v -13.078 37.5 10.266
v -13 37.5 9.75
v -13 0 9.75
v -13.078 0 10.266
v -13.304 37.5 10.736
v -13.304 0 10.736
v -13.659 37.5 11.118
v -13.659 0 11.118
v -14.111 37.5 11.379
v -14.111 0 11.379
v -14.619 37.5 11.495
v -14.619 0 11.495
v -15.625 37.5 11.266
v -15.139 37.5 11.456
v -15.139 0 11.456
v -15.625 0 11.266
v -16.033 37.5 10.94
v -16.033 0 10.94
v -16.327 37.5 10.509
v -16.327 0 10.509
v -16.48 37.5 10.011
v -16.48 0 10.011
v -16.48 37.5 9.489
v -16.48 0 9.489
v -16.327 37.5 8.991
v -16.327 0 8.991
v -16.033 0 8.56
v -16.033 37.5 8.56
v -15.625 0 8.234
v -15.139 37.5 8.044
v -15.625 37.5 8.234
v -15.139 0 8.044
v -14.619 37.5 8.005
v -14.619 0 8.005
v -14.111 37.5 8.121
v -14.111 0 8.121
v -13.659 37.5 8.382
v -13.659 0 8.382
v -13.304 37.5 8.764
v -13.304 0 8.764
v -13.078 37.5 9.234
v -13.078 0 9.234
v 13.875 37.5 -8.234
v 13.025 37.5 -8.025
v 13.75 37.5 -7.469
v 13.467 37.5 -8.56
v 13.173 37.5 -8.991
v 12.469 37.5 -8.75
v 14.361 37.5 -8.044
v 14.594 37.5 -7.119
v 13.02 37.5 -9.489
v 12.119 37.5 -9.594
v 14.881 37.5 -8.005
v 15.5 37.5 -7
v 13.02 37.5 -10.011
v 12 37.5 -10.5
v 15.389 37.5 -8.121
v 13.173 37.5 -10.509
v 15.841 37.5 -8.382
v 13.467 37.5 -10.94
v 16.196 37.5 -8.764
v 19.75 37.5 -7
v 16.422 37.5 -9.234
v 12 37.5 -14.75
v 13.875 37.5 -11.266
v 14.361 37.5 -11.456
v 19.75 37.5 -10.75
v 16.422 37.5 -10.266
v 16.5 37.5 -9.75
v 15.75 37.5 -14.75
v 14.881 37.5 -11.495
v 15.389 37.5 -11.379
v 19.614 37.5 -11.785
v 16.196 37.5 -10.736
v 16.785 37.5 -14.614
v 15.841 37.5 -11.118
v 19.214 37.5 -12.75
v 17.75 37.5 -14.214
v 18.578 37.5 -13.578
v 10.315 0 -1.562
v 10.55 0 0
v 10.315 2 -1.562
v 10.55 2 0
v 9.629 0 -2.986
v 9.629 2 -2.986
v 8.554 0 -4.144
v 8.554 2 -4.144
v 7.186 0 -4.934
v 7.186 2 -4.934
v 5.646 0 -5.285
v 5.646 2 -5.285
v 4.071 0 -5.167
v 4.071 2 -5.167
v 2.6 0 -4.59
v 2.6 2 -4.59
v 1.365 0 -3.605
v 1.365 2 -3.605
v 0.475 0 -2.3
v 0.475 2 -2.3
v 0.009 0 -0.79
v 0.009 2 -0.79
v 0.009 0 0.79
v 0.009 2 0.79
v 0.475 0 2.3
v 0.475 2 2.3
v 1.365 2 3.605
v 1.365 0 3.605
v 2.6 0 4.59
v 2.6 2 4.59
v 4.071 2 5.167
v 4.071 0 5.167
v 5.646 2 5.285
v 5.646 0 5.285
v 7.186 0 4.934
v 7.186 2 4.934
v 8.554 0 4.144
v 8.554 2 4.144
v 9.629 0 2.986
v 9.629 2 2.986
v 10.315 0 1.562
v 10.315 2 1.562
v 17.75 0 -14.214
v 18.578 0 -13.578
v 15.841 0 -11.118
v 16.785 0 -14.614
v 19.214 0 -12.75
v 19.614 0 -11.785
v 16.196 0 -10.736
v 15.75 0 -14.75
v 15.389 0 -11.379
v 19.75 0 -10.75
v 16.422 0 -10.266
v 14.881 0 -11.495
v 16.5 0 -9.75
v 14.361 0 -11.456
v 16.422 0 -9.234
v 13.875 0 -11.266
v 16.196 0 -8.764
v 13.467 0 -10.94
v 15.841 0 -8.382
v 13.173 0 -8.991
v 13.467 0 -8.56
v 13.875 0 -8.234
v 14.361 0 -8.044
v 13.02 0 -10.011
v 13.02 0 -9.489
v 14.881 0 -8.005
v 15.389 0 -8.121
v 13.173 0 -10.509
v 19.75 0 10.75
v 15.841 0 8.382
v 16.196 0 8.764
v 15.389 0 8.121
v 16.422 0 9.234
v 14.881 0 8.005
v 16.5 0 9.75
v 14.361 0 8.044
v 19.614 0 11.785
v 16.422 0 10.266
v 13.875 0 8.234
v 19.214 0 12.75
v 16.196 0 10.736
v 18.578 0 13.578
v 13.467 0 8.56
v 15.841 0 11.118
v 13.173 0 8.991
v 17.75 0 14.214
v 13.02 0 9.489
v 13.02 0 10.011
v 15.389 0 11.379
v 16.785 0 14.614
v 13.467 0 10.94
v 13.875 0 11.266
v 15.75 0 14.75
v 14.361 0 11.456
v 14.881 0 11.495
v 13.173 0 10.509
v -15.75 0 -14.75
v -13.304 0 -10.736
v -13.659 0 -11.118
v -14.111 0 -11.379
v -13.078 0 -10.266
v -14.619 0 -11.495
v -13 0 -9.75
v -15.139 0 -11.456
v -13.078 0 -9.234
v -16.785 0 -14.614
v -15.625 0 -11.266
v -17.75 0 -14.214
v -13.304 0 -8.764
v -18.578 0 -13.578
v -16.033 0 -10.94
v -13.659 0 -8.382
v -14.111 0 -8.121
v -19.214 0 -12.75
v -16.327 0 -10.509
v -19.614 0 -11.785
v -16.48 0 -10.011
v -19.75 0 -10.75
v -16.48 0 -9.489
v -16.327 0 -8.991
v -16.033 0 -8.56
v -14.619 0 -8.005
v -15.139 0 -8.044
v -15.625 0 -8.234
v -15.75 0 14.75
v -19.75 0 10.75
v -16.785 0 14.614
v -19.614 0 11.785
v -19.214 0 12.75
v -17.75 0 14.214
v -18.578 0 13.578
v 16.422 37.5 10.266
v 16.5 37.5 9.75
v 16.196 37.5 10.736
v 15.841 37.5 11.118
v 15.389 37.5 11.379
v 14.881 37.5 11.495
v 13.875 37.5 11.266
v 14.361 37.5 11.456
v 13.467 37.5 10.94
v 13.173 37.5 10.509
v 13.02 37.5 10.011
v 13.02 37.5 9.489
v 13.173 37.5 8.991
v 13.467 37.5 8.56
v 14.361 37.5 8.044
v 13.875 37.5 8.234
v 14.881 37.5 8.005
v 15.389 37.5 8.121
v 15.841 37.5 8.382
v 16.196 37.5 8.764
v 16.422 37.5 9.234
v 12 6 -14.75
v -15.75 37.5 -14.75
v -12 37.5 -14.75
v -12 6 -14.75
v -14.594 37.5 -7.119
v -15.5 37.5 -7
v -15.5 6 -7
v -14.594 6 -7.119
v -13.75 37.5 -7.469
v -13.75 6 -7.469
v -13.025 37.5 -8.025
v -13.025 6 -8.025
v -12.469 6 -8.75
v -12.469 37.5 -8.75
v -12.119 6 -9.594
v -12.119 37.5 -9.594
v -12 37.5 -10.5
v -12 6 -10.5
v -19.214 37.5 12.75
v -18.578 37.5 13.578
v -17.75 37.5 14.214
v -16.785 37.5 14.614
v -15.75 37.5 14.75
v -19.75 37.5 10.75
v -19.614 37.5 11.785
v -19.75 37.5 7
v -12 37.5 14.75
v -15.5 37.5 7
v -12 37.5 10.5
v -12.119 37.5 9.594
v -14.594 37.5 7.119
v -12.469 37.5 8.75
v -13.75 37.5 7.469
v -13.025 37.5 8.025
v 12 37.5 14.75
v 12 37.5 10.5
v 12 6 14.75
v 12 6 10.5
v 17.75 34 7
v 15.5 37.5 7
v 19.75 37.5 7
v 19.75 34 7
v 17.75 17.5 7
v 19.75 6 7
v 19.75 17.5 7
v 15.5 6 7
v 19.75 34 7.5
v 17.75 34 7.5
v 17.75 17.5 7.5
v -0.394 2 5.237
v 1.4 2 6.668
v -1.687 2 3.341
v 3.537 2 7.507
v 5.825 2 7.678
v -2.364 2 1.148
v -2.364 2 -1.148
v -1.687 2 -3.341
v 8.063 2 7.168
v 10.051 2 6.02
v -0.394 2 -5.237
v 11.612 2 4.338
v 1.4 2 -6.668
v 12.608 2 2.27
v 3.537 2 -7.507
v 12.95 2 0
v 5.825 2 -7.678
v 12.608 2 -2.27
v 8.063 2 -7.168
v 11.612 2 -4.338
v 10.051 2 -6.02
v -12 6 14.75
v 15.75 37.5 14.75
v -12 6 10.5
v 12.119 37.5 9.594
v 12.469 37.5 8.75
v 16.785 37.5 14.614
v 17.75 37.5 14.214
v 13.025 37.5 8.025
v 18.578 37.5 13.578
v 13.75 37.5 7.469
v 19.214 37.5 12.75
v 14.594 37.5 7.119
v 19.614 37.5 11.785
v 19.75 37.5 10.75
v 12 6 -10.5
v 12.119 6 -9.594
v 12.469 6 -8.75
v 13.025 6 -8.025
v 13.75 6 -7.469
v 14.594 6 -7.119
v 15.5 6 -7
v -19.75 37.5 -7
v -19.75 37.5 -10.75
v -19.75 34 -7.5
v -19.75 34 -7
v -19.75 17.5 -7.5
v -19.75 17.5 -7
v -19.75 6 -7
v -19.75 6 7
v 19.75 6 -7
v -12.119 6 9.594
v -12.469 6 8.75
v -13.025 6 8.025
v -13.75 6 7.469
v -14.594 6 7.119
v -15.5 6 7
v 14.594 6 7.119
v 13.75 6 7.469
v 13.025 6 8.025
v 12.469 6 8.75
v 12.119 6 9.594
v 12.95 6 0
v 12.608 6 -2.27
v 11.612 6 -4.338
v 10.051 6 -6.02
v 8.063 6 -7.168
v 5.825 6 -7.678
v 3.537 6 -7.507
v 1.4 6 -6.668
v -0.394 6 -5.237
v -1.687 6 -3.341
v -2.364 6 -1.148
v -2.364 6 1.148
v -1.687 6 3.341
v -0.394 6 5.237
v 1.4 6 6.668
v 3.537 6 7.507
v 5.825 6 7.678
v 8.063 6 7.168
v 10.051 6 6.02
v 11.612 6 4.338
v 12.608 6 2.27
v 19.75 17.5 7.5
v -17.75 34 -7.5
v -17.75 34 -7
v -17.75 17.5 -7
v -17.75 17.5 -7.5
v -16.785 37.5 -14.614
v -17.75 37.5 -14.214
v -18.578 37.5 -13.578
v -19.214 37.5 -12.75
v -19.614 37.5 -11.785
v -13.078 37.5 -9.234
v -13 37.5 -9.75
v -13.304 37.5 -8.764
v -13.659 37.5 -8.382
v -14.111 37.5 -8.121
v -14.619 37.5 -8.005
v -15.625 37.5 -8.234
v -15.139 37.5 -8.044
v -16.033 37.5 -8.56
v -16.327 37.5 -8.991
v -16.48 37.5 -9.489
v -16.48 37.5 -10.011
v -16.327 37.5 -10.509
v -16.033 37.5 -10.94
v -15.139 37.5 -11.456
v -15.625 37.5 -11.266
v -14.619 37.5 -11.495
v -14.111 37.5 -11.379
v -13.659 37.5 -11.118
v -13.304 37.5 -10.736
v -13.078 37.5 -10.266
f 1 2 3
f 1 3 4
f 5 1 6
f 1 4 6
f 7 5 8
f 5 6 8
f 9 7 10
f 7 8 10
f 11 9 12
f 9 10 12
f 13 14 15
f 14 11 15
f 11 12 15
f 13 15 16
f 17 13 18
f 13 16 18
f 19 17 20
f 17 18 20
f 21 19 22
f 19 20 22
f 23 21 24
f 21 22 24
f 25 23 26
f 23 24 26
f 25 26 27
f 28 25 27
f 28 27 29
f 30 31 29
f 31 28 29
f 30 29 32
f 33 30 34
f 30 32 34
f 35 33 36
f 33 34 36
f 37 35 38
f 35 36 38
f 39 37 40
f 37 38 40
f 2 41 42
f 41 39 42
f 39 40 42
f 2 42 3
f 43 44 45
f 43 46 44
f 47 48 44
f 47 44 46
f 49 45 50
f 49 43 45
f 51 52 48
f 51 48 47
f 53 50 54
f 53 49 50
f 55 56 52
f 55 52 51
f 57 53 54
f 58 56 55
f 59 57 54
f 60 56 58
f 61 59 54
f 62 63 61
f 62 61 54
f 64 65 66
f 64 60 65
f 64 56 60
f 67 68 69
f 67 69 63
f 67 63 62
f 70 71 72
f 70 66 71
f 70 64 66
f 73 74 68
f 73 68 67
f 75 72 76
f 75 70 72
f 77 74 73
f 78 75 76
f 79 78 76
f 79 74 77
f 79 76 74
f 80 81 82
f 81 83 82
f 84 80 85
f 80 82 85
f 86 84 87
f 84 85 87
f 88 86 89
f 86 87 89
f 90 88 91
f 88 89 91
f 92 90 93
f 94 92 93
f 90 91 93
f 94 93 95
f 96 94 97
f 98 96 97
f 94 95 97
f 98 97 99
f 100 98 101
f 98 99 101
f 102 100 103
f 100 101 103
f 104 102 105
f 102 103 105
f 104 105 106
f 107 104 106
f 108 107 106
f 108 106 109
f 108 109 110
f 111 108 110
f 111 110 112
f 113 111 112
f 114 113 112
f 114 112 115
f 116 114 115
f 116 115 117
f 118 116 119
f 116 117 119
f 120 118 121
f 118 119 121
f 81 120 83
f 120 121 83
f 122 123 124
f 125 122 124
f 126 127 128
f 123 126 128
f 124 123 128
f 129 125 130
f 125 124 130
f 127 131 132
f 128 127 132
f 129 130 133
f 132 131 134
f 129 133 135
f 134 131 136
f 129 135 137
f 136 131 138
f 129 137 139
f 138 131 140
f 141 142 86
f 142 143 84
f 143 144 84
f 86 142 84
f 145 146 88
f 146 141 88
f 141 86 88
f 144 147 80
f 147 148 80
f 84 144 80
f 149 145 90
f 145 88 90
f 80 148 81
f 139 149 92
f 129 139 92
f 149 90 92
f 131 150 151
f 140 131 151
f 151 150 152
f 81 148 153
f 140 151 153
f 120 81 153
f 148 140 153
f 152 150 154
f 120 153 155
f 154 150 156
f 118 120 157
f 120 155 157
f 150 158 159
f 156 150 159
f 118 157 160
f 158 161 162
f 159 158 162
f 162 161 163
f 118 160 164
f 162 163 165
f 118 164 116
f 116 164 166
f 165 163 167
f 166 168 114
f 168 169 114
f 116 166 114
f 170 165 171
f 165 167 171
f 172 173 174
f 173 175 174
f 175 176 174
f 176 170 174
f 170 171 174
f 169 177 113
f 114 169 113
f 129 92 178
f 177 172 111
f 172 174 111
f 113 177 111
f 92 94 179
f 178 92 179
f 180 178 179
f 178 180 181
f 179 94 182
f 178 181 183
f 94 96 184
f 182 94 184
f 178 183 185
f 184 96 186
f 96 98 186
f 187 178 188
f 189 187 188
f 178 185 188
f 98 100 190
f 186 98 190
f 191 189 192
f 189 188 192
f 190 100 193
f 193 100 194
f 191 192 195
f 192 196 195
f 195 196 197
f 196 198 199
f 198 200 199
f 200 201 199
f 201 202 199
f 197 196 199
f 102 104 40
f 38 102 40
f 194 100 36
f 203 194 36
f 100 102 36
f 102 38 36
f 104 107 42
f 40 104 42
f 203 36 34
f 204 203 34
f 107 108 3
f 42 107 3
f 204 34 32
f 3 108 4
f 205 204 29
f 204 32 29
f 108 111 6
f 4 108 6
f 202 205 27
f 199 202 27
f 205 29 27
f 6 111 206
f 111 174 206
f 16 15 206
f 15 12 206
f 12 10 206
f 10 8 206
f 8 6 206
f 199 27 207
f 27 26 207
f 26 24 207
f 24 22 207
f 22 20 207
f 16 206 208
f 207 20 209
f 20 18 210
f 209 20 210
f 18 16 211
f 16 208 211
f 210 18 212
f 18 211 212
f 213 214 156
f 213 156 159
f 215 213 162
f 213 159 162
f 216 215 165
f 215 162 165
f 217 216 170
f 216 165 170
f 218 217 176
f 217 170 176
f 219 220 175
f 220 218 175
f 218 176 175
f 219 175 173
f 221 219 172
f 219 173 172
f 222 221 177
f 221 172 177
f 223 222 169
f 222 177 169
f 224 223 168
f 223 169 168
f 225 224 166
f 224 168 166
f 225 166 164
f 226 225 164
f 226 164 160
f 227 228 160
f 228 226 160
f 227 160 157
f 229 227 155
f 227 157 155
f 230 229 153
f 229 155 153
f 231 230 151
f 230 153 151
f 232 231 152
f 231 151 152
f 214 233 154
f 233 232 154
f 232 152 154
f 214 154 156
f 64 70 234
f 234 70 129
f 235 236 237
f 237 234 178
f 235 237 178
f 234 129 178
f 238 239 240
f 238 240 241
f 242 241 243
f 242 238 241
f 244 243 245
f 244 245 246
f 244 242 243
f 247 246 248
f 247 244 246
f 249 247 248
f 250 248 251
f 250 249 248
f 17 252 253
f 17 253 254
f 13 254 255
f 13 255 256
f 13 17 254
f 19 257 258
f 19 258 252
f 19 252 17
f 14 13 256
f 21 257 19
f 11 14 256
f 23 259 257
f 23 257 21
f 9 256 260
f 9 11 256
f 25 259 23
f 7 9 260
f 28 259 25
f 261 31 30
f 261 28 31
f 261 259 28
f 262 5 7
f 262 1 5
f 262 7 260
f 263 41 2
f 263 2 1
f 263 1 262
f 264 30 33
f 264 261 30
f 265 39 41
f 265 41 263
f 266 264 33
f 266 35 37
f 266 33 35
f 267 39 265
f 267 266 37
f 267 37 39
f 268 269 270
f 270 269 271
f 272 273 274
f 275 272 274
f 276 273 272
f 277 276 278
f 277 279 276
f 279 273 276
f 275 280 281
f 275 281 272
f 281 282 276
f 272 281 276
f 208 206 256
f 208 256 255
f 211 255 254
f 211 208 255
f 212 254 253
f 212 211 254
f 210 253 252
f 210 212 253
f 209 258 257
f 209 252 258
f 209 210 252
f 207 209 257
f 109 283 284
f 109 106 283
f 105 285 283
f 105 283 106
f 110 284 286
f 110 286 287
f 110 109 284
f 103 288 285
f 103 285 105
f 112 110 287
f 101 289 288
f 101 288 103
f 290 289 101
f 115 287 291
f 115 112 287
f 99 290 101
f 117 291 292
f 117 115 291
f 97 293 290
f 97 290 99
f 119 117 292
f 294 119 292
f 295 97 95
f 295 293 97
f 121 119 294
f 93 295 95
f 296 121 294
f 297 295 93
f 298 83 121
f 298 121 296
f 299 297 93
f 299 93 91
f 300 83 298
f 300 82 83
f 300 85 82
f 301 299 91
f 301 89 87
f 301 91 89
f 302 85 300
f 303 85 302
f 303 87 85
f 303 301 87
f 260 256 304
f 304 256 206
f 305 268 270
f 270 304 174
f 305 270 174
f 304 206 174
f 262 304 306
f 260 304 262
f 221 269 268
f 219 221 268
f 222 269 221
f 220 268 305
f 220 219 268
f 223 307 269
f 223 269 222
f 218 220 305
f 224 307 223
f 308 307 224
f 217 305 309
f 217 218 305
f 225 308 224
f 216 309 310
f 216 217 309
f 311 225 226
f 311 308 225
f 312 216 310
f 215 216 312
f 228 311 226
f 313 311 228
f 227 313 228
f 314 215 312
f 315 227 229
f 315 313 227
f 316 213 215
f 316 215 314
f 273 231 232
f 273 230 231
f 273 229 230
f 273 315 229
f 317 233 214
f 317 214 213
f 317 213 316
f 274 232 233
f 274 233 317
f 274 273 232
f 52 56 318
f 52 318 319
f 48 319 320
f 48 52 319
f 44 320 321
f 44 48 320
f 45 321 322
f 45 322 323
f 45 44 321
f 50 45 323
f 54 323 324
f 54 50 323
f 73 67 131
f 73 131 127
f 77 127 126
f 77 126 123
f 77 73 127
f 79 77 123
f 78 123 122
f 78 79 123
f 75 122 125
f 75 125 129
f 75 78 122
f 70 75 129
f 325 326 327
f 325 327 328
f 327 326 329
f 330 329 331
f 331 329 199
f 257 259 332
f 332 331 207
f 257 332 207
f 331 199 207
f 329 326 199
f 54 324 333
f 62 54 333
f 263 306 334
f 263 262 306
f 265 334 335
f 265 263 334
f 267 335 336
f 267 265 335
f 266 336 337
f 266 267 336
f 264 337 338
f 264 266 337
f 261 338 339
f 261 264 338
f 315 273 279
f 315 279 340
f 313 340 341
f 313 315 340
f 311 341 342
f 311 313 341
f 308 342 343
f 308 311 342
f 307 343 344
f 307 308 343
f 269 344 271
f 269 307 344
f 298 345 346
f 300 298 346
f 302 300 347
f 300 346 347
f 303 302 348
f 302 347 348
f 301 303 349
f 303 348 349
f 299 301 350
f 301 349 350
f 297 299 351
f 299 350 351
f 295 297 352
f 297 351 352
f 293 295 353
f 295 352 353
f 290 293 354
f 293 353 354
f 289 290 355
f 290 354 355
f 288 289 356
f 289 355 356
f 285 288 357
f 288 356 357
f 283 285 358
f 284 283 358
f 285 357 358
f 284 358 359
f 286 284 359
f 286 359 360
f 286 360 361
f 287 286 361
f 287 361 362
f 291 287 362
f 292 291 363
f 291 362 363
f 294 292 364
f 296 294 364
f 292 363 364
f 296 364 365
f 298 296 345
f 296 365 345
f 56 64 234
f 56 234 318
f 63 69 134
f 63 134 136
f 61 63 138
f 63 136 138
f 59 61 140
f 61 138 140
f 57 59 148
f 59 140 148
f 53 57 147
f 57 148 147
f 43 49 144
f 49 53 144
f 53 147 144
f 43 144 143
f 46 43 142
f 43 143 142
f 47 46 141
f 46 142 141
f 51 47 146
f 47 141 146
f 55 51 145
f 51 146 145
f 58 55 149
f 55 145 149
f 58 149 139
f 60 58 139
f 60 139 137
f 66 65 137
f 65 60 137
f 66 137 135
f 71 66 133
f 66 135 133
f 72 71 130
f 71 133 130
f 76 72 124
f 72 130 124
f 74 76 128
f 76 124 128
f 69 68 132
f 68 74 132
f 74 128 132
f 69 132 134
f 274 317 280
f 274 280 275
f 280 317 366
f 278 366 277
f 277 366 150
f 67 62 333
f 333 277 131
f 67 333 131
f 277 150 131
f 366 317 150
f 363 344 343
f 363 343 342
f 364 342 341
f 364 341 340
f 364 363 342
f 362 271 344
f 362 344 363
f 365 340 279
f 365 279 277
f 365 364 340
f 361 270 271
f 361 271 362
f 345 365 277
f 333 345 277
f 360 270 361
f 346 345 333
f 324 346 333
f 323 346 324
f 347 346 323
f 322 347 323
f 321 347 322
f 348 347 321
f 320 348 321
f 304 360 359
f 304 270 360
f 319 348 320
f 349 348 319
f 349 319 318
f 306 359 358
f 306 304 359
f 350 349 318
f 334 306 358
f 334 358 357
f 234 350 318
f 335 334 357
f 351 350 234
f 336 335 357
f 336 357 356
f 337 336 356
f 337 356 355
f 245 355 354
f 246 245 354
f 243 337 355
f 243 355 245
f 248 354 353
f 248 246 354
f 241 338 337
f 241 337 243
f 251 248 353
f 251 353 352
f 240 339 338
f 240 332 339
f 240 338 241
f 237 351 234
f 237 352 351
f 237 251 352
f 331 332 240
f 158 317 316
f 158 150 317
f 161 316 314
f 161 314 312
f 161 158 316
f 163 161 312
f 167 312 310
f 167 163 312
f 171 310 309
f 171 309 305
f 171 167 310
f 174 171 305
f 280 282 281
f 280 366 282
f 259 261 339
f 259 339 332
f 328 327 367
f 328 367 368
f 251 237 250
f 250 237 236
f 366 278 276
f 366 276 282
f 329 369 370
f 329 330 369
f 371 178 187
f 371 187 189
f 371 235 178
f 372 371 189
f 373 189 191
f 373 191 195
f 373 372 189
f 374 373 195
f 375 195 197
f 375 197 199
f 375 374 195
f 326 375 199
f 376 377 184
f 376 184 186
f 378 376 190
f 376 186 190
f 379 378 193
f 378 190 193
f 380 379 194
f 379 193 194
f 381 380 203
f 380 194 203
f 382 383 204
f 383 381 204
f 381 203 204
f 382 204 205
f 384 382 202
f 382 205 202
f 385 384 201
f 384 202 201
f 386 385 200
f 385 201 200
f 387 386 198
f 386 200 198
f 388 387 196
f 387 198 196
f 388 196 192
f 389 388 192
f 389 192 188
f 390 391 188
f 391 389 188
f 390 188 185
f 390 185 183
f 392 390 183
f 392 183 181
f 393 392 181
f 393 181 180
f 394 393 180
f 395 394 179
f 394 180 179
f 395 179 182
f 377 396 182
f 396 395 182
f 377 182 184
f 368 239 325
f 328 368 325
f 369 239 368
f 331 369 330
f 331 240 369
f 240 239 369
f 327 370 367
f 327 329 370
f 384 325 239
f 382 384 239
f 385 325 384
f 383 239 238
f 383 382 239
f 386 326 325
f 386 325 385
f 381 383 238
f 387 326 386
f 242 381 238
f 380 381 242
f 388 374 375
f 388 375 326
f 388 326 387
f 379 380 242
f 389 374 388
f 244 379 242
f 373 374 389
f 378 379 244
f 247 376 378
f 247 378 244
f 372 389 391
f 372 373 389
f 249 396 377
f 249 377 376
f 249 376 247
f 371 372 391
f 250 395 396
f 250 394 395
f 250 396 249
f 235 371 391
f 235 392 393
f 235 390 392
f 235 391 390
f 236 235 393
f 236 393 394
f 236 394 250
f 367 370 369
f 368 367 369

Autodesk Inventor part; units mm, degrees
ref_plane "YZ Plane" through (0, 0, 0) normal (1, 0, 0) x (0, 1, 0)
ref_plane "XZ Plane" through (0, 0, 0) normal (0, 1, 0) x (-1, 0, 0)
ref_plane "XY Plane" through (0, 0, 0) normal (0, 0, 1) x (1, 0, 0)
sketch "Skizze1" plane through (0, 0, 0) normal (0, 1, 0) x (-1, 0, 0)
  line L0 (-19.75, -14.75) -> (19.75, -14.75)
  line L1 (19.75, -14.75) -> (19.75, 14.75)
  line L2 (19.75, 14.75) -> (-19.75, 14.75)
  line L3 (-19.75, 14.75) -> (-19.75, -14.75)
  line L4 (0, -20.65) -> (0, 20.65) projected
  line L5 (27.65, 0) -> (-27.65, 0) projected
  point P0 (0, 0)
  dimension "d0" = 39.5
  dimension "d1" = 29.5
extrude "Extrusion1" add sketch "Skizze1" along normal blind 6
sketch "Skizze2" plane through (0, 6, 0) normal (0, 1, 0) x (1, 0, 0)
  line L0 (19.75, 14.75) -> (-19.75, 14.75) projected
  line L1 (-19.75, 14.75) -> (-11.75, 14.75)
  line L2 (-12, 12.75) -> (-12, 7)
  line L3 (-12, 7) -> (-17.75, 7)
  line L4 (-19.75, 6.75) -> (-19.75, 14.75)
  line L5 (19.75, 14.75) -> (10.75, 14.75)
  line L6 (12, 12.75) -> (12, 7)
  line L7 (12, 7) -> (17.75, 7)
  line L8 (19.75, 10.8731) -> (19.75, 14.75)
  line L9 (-19.75, -14.75) -> (19.75, -14.75) projected
  line L10 (-19.75, -14.75) -> (-11.75, -14.75)
  line L11 (-12, -12.75) -> (-12, -7)
  line L12 (-12, -7) -> (-17.75, -7)
  line L13 (-19.75, -6.75) -> (-19.75, -14.75)
  line L14 (19.75, -14.75) -> (11.75, -14.75)
  line L15 (12, -12.75) -> (12, -7)
  line L16 (12, -7) -> (17.75, -7)
  line L17 (19.75, -6.75) -> (19.75, -14.75)
  circle A0 centre (-14.75, 9.75) radius 1.75
  circle A1 centre (-14.75, -9.75) radius 1.75
  circle A2 centre (14.75, -9.75) radius 1.75
  circle A3 centre (14.75, 9.75) radius 1.75
  line L18 (-19.75, 14.75) -> (-19.75, -14.75) projected
  line L19 (-19.75, 14.75) -> (19.75, 14.75)
  line L20 (19.75, 14.75) -> (19.75, -14.75)
  line L21 (19.75, -14.75) -> (-19.75, -14.75)
  line L22 (-19.75, -14.75) -> (-19.75, 14.75)
  line L23 (17.75, 12.75) -> (-17.75, 12.75)
  line L24 (-17.75, 12.75) -> (-17.75, -12.75)
  line L25 (-17.75, -12.75) -> (17.75, -12.75)
  line L26 (17.75, 12.75) -> (17.75, -12.75)
  point P0 (0, 0)
  dimension "d12" = 3.5
  dimension "d13" = 5
  dimension "d14" = 5
  dimension "d15" = 3.5
  dimension "d16" = 5
  dimension "d17" = 5
  dimension "d18" = 3.5
  dimension "d19" = 5
  dimension "d20" = 5
  dimension "d21" = 3.5
  dimension "d22" = 5
  dimension "d23" = 5
  dimension "d24" = 2
  dimension "d25" = 2
  dimension "d28" = 2
  dimension "d29" = 2
  dimension "d30" = 7.75
  dimension "d31" = 7.75
  dimension "d35" = 7.75
  dimension "d36" = 7.75
  dimension "d37" = 7.75
  dimension "d38" = 7.75
  dimension "d39" = 7.75
  dimension "d40" = 7.75
sketch "Skizze3" plane through (0, 6, 0) normal (0, 1, 0) x (1, 0, 0)
  circle A0 centre (5.25, 0) radius 7.7
  line L0 (19.75, -14.75) -> (19.75, 14.75) projected
  line L1 (19.75, 14.75) -> (-19.75, 14.75) projected
  point P0 (0, 0)
  dimension "d32" = 15.4
  dimension "d33" = 14.5
  dimension "d34" = 14.75
extrude "Extrusion2" add sketch "Skizze2" along normal blind 31.5 contours L8 L20 L17 L9 L13 L18 L4 L0
extrude "Extrusion3" cut sketch "Skizze3" against normal blind 4
sketch "Skizze4" plane through (5.25, 2, 0) normal (0, 1, 0) x (1, 0, 0)
  circle A0 centre (0, 0) radius 5.3
  point P0 (-5.25, 0)
  dimension "d45" = 10.6
extrude "Extrusion4" cut sketch "Skizze4" against normal up to surface (2 mm away)
extrude "Extrusion5" add sketch "Skizze2" along normal blind 31.5 contours L26 L25 L15 L16
extrude "Extrusion6" add sketch "Skizze2" along normal blind 31.5 contours L2 L3 L24 L23 | L23 L26 L7 L6 | L12 L11 L25 L24
extrude "Extrusion7" cut sketch "Skizze2" against normal up to surface (6 mm away) contours A0 | A1 | A2 | A3
fillet "Rundung1" radius 3.5 4 edges at (-12, 21.75, -7) (12, 21.75, -7) (-12, 21.75, 7) (12, 21.75, 7)
fillet "Rundung2" radius 4 4 edges at (19.75, 18.75, 14.75) (19.75, 18.75, -14.75) (-19.75, 18.75, -14.75) (-19.75, 18.75, 14.75)
sketch "Skizze5" plane through (-15.75, 0, 14.75) normal (0, 0, 1) x (1, 0, 0)
  line L0 (3.75, 34) -> (27.75, 34)
  line L1 (27.75, 34) -> (27.75, 17.5)
  line L2 (27.75, 17.5) -> (3.75, 17.5)
  line L3 (3.75, 17.5) -> (3.75, 34)
  line L4 (0, 37.5) -> (31.5, 37.5) projected
  line L5 (-4, 37.5) -> (-4, 0) projected
  line L6 (35.5, 0) -> (35.5, 37.5) projected
  point P0 (15.75, 0)
  dimension "d56" = 16.5
  dimension "d57" = 3.5
  dimension "d58" = 7.75
  dimension "d59" = 7.75
sketch "Skizze6" plane through (15.75, 0, -14.75) normal (0, 0, -1) x (-1, 0, 0)
  line L0 (31.25, 6) -> (27.75, 6) projected
  line L1 (3.75, 34) -> (27.75, 34)
  line L2 (27.75, 34) -> (27.75, 6)
  line L3 (27.75, 6) -> (3.75, 6)
  line L4 (3.75, 6) -> (3.75, 34)
  line L5 (0, 37.5) -> (31.5, 37.5) projected
  point P0 (15.75, 0)
  dimension "d60" = 3.5
extrude "Extrusion8" cut sketch "Skizze6" against normal up to surface (2 mm away)
extrude "Extrusion9" cut sketch "Skizze5" against normal up to surface (2 mm away)
sketch "Skizze7" plane through (-19.75, 0, -10.75) normal (-1, 0, 0) x (0, 0, 1)
  line L0 (3.25, 34) -> (17.25, 34)
  line L1 (17.25, 34) -> (17.25, 17.5)
  line L2 (17.25, 17.5) -> (3.25, 17.5)
  line L3 (3.25, 17.5) -> (3.25, 34)
  line L4 (-4, 37.5) -> (-4, 0) projected
  line L5 (0, 37.5) -> (21.5, 37.5) projected
  point P0 (10.75, 0)
  dimension "d65" = 14
  dimension "d66" = 16.5
  dimension "d67" = 7.25
  dimension "d68" = 3.5
extrude "Extrusion10" cut sketch "Skizze7" against normal up to surface (2 mm away)
sketch "Skizze8" plane through (19.75, 0, 10.75) normal (1, 0, 0) x (0, 0, -1)
  line L0 (3.25, 34) -> (17.25, 34)
  line L1 (17.25, 34) -> (17.25, 17.5)
  line L2 (17.25, 17.5) -> (3.25, 17.5)
  line L3 (3.25, 17.5) -> (3.25, 34)
  line L4 (-4, 37.5) -> (-4, 0) projected
  line L5 (0, 37.5) -> (21.5, 37.5) projected
  point P0 (10.75, 0)
  dimension "d71" = 14
  dimension "d72" = 16.5
  dimension "d73" = 7.25
  dimension "d74" = 3.5
extrude "Extrusion11" cut sketch "Skizze8" against normal up to surface (2 mm away)
sketch "Skizze12" plane through (15.75, 0, -14.75) normal (0, 0, -1) x (-1, 0, 0)
  line L0 (27.75, 34) -> (3.75, 34) projected
  line L1 (27.75, 6) -> (27.75, 37.5) projected
  line L2 (3.75, 34) -> (27.75, 34)
  line L3 (27.75, 34) -> (27.75, 37.5)
  line L4 (27.75, 37.5) -> (3.75, 37.5)
  line L5 (3.75, 37.5) -> (3.75, 34)
  point P0 (15.75, 0)
extrude "Extrusion14" cut sketch "Skizze12" against normal up to surface (2 mm away)
sketch "Skizze13" plane through (12, 37.5, 12.75) normal (0, 0, -1) x (-1, 0, 0)
  line L0 (0, 0) -> (0, -31.5) projected
  line L1 (24, -31.5) -> (24, 0) projected
  line L2 (0, -3.5027) -> (24, -3.5027)
  line L3 (24, -3.5027) -> (24, 0)
  line L4 (24, 0) -> (0, 0)
  line L5 (0, 0) -> (0, -3.5027)
  point P0 (12, -37.5)
  point P1 (24, -3.5027)
extrude "Extrusion15" cut sketch "Skizze13" against normal up to surface (2 mm away)
sketch "Skizze14" plane through (-15.75, 0, 14.75) normal (0, 0, 1) x (1, 0, 0)
  line L0 (3.75, 6) -> (3.75, 17.5) projected
  line L1 (27.75, 17.5) -> (27.75, 6) projected
  line L2 (3.75, 17.5) -> (27.75, 17.5)
  line L3 (27.75, 17.5) -> (27.75, 6)
  line L4 (27.75, 6) -> (3.75, 6)
  line L5 (3.75, 6) -> (3.75, 17.5)
  point P0 (15.75, 0)
  point P1 (27.75, 17.5)
extrude "Extrusion16" cut sketch "Skizze14" against normal up to surface (2 mm away)
sketch "Skizze15" plane through (-19.75, 0, -10.75) normal (-1, 0, 0) x (0, 0, 1)
  point P0 (10.75, 0)
sketch "Skizze16" plane through (-17.75, 6, 7) normal (1, 0, 0) x (0, 0, -1)
  line L0 (14, 0) -> (0, 0) projected
  line L1 (14, 11.5) -> (14, 28) projected
  line L2 (0, 0) -> (14, 0)
  line L3 (14, 0) -> (14, 11.5)
  line L4 (14, 11.5) -> (0, 11.5)
  line L5 (0, 11.5) -> (0, 0)
  line L6 (0, 31.5) -> (14, 31.5) projected
  line L7 (14, 28) -> (0, 28)
  line L8 (0, 28) -> (0, 31.5)
  line L9 (0, 31.5) -> (14, 31.5)
  line L10 (14, 31.5) -> (14, 28)
  point P0 (7, -6)
extrude "Extrusion17" cut sketch "Skizze16" against normal up to surface (2 mm away) contours L7 L8 L6 L10
extrude "Extrusion18" cut sketch "Skizze16" against normal up to surface (2 mm away) contours L0 L5 L4 L3
sketch "Skizze17" plane through (-17.75, 34, 6.5) normal (0, 0, -1) x (-1, 0, 0)
  line L0 (0, 0) -> (2, 0) projected
  line L1 (2, 0) -> (2, -16.5) projected
  line L2 (0, 0) -> (2, 0)
  line L3 (2, 0) -> (2, -16.5)
  line L4 (2, -16.5) -> (0, -16.5)
  line L5 (0, -16.5) -> (0, 0)
  point P0 (-17.75, -34)
extrude "Extrusion19" cut sketch "Skizze17" against normal blind 0.5
sketch "Skizze18" plane through (17.75, 6, -7) normal (-1, 0, 0) x (0, 0, 1)
  line L0 (14, 28) -> (14, 31.5) projected
  line L1 (0.5, 28) -> (14, 28) projected
  line L2 (14, 31.5) -> (0.5, 31.5)
  line L3 (0.5, 31.5) -> (0.5, 28)
  line L4 (0.5, 28) -> (14, 28)
  line L5 (14, 28) -> (14, 31.5)
  line L6 (14, 0) -> (0, 0) projected
  line L7 (14.5, 11.5) -> (14, 11.5) projected
  line L8 (0, 0) -> (14, 0)
  line L9 (14, 0) -> (14, 11.5)
  line L10 (14, 11.5) -> (0, 11.5)
  line L11 (0, 11.5) -> (0, 0)
  point P0 (7, -6)
extrude "Extrusion20" cut sketch "Skizze18" against normal up to surface (2 mm away) contours L6 L11 L10 L9
extrude "Extrusion21" cut sketch "Skizze18" against normal up to surface (2 mm away) contours L1 L3 L2 L0
sketch "Skizze19" plane through (17.75, 37.5, -6.5) normal (0, 0, 1) x (1, 0, 0)
  line L0 (0, -20) -> (0, 0) projected
  line L1 (2, 0) -> (2, -20) projected
  line L2 (0, -20) -> (2, -20)
  line L3 (2, -20) -> (2, 0)
  line L4 (2, 0) -> (0, 0)
  line L5 (0, 0) -> (0, -20)
  point P0 (-17.75, -37.5)
extrude "Extrusion22" cut sketch "Skizze19" against normal blind 0.5
properties part number "_3D-Druck"
